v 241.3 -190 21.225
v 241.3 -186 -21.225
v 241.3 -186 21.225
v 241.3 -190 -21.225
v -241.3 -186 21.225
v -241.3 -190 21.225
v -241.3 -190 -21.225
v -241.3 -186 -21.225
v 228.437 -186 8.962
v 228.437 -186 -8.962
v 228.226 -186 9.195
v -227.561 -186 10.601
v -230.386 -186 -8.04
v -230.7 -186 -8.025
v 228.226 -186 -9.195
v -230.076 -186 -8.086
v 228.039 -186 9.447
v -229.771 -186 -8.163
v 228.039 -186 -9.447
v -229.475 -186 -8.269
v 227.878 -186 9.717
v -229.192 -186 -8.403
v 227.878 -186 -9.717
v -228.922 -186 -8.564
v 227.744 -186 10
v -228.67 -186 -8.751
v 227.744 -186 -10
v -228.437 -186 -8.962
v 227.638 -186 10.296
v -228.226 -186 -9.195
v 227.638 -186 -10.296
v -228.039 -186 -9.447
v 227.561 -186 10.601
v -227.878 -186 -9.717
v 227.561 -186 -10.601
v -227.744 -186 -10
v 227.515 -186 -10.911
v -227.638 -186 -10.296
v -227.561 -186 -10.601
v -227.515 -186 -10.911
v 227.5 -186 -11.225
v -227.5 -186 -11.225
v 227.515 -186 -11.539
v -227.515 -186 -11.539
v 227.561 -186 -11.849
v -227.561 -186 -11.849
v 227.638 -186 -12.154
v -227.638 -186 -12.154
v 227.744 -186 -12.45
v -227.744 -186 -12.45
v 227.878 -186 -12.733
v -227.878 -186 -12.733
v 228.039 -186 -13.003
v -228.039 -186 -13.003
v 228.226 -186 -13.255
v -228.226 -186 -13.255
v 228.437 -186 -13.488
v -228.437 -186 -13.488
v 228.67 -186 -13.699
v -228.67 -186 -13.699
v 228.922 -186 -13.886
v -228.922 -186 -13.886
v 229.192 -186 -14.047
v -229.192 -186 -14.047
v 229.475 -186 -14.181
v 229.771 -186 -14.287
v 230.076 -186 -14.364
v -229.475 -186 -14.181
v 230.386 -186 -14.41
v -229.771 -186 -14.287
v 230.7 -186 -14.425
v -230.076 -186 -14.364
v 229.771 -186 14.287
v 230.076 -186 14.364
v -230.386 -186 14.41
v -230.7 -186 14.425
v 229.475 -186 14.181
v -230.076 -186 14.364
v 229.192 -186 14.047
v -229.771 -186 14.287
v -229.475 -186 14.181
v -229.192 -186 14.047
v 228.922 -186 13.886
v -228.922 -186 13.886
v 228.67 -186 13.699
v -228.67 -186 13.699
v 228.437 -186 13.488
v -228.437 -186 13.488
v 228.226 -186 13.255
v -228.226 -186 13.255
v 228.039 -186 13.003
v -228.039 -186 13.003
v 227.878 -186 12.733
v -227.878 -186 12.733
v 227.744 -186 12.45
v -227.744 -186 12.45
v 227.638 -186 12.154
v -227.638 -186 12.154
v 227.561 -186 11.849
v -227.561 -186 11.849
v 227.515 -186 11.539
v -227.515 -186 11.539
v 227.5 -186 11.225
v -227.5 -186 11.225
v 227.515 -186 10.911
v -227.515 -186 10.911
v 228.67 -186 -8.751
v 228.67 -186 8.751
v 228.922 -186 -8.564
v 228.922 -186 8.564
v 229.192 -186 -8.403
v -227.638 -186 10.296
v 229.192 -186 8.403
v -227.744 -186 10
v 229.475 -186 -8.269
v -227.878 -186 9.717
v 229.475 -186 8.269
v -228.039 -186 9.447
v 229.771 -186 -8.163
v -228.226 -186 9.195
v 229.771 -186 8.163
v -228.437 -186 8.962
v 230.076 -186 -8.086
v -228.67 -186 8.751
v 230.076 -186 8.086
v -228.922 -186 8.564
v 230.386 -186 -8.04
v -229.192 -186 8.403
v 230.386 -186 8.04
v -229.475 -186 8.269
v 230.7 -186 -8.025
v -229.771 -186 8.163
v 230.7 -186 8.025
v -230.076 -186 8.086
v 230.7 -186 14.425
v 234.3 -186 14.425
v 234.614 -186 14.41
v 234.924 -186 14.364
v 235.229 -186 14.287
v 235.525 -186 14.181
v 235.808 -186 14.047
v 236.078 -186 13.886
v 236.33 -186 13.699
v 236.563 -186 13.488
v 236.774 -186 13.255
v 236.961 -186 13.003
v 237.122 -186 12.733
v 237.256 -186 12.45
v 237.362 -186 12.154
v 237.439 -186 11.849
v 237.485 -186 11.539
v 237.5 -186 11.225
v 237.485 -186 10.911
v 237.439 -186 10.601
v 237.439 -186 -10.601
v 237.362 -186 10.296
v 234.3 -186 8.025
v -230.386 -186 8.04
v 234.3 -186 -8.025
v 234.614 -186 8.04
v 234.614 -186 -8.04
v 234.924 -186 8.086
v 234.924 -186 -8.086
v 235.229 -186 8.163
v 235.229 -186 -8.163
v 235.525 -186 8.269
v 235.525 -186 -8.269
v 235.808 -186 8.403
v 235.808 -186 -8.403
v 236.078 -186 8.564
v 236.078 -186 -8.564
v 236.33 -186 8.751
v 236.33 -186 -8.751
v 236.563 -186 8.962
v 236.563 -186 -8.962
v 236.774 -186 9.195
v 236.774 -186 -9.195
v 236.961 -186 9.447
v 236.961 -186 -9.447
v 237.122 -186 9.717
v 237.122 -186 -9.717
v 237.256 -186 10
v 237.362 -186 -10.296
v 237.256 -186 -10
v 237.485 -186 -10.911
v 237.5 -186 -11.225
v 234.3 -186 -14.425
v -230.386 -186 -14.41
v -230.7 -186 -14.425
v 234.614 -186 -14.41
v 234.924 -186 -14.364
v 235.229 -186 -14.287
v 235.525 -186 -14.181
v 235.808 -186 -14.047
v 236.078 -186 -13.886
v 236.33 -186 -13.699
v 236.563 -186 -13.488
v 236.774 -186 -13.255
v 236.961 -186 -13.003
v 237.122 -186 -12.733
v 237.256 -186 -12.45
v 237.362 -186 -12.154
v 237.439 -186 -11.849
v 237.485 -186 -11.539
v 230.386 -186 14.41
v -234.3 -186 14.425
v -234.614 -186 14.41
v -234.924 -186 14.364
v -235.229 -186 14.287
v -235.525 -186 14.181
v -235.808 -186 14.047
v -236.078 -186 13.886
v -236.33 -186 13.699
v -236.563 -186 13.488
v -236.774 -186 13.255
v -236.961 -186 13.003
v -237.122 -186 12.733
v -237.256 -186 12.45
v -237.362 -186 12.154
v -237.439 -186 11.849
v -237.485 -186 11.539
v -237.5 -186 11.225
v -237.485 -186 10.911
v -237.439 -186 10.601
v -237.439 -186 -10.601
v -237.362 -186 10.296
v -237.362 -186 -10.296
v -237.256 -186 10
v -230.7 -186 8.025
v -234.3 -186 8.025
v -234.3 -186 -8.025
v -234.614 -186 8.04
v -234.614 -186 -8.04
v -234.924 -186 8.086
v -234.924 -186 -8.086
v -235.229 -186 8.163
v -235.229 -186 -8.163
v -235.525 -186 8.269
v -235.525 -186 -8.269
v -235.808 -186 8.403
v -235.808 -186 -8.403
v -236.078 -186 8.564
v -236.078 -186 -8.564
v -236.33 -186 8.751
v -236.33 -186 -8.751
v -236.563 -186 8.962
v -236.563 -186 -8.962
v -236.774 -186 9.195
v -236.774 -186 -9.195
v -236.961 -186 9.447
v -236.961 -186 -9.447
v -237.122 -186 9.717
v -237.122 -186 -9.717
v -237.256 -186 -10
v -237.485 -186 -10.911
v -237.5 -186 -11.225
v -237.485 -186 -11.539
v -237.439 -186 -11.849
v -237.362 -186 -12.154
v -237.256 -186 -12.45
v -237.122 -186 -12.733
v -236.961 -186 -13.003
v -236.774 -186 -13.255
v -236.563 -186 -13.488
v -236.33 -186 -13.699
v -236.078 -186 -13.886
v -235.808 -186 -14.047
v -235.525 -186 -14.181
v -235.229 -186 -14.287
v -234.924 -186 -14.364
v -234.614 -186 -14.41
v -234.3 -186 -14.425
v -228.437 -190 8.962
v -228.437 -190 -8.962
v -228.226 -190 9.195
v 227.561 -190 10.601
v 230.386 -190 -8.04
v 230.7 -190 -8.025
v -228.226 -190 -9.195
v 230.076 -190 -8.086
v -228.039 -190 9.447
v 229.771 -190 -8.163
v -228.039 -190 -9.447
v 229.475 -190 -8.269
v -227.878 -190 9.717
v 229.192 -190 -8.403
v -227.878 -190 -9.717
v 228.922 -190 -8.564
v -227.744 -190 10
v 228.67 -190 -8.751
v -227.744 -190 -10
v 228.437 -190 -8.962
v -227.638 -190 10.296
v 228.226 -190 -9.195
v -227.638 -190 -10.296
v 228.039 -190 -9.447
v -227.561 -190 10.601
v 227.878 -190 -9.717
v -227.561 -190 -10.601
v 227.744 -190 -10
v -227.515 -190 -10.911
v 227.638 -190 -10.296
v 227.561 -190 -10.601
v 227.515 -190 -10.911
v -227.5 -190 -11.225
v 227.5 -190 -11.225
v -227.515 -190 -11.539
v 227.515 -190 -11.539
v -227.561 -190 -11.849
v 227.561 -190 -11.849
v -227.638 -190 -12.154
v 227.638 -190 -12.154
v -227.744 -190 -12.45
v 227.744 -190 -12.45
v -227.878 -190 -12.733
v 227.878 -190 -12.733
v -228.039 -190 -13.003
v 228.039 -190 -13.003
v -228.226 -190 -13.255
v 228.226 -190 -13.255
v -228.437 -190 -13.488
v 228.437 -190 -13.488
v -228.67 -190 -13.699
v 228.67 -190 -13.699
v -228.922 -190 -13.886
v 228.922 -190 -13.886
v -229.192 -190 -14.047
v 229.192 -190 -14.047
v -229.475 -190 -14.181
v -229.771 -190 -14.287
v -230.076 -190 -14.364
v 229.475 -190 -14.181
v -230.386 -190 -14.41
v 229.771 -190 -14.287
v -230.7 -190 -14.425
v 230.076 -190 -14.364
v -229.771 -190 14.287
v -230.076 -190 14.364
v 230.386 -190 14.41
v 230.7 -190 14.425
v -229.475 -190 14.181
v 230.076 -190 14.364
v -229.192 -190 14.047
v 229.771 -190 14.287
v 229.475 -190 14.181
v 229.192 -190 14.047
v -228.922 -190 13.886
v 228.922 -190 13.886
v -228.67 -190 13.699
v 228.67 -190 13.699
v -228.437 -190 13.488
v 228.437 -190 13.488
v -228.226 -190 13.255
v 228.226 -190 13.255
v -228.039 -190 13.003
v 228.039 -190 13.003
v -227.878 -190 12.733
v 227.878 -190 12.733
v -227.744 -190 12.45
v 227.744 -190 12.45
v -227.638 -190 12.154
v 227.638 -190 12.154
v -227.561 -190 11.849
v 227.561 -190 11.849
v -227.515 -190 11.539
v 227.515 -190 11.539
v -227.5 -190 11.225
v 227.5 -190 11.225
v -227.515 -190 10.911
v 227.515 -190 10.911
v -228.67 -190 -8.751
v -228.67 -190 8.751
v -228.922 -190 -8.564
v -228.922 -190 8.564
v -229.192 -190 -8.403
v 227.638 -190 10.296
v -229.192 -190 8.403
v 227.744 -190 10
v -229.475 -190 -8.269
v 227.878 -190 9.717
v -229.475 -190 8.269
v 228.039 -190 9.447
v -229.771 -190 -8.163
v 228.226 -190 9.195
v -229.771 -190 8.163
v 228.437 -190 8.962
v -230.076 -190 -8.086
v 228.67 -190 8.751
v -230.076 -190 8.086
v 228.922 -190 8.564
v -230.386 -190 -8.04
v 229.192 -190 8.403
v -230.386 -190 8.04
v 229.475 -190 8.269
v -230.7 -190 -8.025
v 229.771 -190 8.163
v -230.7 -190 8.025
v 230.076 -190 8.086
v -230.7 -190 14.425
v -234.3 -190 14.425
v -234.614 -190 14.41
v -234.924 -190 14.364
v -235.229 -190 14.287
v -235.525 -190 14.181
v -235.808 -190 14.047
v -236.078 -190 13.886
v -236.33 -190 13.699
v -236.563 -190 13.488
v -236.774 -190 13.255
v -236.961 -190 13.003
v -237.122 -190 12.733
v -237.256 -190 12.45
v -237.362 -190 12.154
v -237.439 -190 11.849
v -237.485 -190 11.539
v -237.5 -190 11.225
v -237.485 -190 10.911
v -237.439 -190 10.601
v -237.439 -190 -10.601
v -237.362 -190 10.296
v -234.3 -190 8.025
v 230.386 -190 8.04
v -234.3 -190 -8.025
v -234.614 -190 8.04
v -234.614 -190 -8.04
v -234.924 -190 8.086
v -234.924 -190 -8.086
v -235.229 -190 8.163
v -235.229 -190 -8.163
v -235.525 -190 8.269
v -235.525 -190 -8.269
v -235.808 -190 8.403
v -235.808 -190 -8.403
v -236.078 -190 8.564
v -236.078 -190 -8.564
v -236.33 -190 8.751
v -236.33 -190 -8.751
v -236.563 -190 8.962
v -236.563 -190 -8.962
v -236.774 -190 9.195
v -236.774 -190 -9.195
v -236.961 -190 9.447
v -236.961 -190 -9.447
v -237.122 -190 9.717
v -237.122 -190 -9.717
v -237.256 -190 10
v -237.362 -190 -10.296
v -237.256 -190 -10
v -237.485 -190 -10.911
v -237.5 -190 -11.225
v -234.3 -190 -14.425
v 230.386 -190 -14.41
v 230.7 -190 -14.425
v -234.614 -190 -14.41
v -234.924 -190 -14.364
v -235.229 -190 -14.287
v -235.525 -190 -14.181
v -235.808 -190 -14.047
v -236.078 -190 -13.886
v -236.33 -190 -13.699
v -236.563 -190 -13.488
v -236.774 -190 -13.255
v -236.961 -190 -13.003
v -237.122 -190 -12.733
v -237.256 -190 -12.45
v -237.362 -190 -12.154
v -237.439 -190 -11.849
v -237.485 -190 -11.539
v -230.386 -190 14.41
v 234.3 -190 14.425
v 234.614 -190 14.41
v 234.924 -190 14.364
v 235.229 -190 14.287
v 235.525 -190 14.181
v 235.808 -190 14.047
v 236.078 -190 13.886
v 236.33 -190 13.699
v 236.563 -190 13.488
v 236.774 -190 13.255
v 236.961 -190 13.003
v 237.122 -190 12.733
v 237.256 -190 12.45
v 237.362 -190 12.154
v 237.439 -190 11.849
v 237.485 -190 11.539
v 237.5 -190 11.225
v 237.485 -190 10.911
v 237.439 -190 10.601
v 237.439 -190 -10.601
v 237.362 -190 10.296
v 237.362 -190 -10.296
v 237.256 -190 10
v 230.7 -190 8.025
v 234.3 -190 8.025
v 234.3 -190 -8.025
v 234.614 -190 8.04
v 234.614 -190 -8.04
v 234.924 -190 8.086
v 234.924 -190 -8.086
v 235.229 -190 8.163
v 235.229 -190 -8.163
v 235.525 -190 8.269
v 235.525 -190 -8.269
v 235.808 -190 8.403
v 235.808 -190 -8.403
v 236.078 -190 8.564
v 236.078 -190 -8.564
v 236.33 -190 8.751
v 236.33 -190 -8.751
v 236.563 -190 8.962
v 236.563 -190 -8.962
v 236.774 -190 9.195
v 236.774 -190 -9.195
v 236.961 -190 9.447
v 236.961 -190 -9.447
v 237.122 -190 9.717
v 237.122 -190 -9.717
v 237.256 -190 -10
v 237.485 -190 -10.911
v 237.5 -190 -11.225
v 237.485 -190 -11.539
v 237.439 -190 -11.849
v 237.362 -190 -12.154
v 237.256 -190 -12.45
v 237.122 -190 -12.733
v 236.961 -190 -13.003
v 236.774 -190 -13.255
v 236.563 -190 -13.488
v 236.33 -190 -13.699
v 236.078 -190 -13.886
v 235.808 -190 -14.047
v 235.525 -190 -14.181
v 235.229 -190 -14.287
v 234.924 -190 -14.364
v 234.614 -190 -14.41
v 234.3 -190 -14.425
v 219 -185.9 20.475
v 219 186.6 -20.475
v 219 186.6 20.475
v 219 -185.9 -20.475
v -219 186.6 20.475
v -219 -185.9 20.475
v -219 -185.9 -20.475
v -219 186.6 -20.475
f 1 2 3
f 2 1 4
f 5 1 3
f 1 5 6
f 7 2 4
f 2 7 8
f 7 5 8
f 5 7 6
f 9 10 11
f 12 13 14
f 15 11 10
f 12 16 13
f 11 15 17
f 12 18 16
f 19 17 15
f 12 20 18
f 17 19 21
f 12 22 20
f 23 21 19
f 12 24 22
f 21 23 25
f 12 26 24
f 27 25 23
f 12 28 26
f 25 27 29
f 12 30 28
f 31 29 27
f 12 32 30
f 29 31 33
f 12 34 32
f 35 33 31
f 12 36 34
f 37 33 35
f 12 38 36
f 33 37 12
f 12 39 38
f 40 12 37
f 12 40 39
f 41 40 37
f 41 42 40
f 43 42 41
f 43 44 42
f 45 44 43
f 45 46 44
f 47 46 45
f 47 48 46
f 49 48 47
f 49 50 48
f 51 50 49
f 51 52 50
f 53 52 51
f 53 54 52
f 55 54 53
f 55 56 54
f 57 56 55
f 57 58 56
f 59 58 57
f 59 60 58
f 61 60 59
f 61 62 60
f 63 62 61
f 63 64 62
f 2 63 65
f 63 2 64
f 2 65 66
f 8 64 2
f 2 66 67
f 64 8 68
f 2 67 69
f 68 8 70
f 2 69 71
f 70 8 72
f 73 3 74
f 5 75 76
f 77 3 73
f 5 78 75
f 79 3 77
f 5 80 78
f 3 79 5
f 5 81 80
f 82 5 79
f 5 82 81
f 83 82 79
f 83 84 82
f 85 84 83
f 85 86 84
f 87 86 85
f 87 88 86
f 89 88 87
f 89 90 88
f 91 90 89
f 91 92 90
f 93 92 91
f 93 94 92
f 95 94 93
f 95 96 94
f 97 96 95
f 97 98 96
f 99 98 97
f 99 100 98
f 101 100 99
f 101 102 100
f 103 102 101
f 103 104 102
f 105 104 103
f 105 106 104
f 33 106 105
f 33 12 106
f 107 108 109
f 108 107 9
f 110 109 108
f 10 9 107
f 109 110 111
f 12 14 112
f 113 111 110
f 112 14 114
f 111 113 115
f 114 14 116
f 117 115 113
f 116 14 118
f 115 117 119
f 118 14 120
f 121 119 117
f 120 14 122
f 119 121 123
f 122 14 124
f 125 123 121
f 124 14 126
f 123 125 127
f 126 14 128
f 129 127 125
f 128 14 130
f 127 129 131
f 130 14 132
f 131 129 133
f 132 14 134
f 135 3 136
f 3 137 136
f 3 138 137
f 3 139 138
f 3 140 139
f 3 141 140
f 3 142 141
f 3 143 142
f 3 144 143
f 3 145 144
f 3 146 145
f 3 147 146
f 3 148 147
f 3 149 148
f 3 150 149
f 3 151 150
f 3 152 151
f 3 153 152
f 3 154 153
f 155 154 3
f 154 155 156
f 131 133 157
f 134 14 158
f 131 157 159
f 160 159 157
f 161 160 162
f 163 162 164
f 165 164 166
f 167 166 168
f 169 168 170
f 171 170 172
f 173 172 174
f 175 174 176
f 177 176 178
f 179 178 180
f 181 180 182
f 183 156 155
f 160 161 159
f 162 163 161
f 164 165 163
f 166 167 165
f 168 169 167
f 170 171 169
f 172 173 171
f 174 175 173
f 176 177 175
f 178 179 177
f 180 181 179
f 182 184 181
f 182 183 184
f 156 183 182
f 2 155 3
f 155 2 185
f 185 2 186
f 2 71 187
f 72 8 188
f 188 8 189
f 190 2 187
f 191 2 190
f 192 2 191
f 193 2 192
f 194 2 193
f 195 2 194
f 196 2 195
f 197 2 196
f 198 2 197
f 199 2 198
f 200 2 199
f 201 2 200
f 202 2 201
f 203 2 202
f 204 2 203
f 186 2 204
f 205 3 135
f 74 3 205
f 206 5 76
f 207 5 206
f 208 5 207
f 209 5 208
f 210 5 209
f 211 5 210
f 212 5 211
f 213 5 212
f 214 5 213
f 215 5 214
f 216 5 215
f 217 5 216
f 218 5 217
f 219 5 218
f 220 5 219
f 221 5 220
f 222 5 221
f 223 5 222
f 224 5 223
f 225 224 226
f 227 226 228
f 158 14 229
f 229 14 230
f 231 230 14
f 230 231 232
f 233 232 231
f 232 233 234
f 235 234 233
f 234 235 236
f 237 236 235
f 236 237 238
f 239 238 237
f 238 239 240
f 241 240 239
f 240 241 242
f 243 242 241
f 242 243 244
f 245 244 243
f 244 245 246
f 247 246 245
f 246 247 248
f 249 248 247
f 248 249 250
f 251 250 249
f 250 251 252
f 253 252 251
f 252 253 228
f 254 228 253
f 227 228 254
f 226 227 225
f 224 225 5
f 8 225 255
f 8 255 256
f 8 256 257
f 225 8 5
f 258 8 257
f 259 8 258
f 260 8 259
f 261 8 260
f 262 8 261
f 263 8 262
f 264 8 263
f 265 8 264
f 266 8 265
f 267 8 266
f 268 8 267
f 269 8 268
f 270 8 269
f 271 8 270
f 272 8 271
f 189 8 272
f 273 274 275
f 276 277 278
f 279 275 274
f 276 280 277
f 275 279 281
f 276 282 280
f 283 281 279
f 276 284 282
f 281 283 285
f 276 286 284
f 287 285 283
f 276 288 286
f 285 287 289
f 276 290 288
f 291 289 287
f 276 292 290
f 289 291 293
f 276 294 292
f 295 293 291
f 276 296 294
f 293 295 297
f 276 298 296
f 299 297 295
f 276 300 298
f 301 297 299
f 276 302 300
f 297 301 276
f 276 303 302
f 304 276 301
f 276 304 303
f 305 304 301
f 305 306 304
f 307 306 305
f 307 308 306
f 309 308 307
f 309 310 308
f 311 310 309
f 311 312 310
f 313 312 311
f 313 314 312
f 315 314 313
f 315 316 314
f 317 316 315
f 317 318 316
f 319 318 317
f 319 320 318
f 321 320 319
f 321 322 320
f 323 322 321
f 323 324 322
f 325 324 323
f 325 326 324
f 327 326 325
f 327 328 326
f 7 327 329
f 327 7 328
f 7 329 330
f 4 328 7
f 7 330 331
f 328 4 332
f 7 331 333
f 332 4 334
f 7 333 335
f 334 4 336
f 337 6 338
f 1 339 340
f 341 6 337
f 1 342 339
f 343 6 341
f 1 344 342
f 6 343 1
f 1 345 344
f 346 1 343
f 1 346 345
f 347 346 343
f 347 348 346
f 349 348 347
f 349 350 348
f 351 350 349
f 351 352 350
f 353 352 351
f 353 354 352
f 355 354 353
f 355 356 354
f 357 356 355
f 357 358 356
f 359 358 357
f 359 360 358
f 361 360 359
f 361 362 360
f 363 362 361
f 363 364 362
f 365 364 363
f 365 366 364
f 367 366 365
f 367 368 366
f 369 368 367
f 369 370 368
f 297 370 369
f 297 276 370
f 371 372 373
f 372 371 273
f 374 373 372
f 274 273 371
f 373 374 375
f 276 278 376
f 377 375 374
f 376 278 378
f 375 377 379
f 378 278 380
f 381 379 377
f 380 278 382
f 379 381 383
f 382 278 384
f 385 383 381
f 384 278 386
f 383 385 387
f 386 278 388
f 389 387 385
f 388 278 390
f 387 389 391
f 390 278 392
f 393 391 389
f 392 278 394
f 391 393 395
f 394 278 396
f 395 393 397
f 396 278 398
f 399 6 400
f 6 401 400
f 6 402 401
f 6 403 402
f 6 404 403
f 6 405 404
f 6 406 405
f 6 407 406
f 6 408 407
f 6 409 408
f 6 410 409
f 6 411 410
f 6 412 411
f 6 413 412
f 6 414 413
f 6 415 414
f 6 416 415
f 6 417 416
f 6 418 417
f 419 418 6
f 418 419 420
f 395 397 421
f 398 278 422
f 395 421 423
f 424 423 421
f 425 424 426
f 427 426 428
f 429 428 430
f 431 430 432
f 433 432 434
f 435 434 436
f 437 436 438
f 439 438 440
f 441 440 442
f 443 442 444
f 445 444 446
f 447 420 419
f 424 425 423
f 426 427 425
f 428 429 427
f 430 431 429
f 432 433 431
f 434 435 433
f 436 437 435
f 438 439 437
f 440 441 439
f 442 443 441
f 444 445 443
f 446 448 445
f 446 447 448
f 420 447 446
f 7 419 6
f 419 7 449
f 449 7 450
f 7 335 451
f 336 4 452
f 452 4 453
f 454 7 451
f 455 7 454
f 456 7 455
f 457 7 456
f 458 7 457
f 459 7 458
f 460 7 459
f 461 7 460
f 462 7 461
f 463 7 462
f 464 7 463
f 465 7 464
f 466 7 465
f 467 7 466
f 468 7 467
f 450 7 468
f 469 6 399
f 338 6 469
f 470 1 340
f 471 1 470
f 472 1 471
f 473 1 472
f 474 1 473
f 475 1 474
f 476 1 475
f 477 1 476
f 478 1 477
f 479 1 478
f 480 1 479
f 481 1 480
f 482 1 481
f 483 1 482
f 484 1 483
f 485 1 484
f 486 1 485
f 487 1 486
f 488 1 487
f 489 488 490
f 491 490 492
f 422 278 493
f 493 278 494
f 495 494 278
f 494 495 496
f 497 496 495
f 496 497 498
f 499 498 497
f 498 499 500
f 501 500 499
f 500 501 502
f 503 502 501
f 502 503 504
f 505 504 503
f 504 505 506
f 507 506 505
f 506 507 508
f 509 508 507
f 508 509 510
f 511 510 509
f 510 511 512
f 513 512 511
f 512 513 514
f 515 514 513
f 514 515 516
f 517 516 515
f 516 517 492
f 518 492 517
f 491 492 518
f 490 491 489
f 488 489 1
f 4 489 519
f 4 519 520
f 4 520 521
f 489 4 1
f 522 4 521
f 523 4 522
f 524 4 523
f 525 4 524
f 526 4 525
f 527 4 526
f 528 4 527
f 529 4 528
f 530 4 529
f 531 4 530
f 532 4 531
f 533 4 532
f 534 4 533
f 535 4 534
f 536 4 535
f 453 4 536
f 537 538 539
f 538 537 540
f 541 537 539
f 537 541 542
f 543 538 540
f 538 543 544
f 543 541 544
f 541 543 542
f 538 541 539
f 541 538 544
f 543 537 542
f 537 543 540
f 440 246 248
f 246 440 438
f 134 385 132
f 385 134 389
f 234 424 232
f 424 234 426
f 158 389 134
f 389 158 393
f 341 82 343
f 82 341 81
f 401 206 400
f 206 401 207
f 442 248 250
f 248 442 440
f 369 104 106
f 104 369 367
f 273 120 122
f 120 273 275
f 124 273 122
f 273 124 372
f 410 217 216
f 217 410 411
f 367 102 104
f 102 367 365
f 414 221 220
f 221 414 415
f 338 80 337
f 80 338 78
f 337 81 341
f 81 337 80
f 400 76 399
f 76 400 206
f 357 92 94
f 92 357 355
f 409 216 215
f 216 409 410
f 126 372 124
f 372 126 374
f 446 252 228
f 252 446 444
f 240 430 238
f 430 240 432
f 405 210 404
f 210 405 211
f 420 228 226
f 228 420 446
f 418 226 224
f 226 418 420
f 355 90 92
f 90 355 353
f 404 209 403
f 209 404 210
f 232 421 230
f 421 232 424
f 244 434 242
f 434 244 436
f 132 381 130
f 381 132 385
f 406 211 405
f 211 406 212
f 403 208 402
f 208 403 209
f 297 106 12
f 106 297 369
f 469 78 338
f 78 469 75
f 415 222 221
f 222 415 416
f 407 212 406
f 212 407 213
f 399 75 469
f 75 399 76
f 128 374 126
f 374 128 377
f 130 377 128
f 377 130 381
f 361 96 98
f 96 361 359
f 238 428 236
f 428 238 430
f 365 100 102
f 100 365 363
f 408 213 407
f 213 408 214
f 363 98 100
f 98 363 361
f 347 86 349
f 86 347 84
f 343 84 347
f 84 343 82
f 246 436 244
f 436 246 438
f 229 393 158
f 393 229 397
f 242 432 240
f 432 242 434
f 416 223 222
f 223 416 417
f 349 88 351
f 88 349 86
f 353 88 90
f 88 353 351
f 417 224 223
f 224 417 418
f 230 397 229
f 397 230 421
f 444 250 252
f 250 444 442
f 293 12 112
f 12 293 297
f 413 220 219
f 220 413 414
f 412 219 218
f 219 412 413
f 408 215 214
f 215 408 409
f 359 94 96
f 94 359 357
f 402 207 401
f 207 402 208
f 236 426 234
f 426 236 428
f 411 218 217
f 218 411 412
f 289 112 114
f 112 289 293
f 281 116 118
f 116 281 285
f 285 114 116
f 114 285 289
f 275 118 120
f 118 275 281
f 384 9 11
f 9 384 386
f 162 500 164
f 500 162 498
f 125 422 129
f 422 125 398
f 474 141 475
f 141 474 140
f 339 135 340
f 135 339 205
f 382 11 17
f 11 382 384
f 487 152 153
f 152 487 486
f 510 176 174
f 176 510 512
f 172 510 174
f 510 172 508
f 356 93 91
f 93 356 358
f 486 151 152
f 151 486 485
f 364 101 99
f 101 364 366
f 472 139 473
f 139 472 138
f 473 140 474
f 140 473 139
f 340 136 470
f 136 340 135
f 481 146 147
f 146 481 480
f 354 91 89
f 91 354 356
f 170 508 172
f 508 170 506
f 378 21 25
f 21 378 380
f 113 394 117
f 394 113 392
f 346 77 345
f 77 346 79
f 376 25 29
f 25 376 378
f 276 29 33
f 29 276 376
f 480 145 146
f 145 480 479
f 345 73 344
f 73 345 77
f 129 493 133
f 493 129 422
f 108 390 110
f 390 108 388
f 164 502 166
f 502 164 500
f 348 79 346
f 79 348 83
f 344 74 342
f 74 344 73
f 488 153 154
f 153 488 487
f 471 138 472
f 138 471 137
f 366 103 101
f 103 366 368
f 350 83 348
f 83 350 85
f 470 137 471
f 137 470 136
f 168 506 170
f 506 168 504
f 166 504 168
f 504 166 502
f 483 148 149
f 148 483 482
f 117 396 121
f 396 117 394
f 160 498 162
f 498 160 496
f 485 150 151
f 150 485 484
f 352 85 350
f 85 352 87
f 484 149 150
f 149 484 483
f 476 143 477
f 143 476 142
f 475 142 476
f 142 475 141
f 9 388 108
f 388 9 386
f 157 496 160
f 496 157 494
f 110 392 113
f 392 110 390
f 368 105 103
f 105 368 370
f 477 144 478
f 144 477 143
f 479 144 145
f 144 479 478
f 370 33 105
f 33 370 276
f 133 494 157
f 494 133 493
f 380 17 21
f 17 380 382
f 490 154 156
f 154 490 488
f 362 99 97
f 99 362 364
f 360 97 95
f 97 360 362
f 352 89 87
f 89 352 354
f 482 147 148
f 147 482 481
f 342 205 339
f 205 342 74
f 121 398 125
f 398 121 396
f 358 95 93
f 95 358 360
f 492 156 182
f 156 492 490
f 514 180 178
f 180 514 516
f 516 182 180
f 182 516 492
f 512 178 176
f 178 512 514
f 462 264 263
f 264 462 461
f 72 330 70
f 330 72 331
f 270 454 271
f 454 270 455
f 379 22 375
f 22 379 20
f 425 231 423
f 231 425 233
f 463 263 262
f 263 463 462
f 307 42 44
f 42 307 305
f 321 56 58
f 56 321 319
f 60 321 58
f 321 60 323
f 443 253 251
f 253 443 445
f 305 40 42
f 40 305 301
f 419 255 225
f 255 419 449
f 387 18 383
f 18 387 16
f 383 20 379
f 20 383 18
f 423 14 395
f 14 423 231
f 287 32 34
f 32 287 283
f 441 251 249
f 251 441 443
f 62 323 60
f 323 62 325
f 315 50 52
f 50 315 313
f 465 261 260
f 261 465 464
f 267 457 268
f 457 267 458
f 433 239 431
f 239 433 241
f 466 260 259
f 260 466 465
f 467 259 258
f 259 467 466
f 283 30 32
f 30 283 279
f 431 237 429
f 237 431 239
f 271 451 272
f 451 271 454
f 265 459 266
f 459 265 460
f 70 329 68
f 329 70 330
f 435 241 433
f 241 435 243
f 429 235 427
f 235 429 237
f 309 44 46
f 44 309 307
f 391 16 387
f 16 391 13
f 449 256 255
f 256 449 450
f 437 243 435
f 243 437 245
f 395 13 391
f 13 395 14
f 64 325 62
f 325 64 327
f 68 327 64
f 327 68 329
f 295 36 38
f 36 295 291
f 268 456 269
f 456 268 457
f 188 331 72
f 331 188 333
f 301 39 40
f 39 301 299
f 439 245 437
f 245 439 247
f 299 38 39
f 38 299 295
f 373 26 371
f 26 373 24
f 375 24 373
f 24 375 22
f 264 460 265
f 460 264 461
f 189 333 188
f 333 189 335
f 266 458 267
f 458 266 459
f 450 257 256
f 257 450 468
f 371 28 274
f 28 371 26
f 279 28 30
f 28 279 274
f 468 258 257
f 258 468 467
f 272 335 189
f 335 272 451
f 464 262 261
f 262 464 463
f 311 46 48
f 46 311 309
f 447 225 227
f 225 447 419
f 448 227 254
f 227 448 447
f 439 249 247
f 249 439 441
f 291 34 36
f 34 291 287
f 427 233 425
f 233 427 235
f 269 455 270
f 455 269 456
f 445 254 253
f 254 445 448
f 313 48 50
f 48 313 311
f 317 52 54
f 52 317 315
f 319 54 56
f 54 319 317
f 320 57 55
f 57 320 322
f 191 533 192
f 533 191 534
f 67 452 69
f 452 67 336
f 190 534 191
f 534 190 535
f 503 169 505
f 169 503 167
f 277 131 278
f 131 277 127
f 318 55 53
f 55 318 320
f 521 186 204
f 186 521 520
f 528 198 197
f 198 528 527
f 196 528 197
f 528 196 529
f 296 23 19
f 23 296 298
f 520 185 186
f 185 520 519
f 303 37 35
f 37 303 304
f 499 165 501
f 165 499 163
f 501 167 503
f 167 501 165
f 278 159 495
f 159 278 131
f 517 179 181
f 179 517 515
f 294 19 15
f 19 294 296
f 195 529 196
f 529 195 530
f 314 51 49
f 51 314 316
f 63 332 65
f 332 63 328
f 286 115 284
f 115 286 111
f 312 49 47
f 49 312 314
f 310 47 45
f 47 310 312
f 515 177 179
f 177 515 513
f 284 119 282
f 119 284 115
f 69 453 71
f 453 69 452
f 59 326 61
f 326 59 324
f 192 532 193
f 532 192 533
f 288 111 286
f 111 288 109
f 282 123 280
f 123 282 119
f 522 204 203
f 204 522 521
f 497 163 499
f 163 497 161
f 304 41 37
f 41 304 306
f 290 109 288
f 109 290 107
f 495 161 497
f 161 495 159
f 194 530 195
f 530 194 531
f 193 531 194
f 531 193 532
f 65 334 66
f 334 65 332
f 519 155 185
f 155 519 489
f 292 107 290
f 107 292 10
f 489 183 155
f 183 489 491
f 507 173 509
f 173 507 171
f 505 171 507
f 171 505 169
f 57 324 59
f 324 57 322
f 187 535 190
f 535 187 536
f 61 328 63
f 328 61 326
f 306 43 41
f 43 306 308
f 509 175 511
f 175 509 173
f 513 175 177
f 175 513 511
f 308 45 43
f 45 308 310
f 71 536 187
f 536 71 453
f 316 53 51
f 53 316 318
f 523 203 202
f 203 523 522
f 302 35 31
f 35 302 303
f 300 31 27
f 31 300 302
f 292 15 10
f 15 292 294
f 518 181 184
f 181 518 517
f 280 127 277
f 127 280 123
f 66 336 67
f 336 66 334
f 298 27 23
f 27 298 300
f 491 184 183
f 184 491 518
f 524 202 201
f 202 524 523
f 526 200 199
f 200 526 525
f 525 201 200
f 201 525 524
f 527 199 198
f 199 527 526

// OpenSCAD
// ============================================================================
// Atom Lithography Machine — Parametric OpenSCAD Module (S3.3-04)
// ============================================================================
// part_id           : S3.3-04
// parent_bom_id     : S3.3
// subsystem         : S3
// part_name         : 1U EMI kalkanli sayim sase ve senkronizasyon arayuzu
// material          : Al 6061
// temp_stage        : 300 K (kabin)
// vacuum_grade      : Atmosfer
// tolerance         : ISO 2768-mK
// computed_mass_kg  : 4.01454
// envelope_mm       : 482.600 x 415.000 x 42.450
// design_maturity   : M0_M1_DETAILED_CAD_DESIGN_ONLY
// no_lab_measurement: true
// iec61508_certified: false
// semi_s2_certified : false
// Units: millimeters (mm)
// ============================================================================

$fn = 64;

// Nominal bounding envelope parameters (mm)
bbox_x = 482.6000;
bbox_y = 415.0000;
bbox_z = 42.4500;

// Part-specific parametric dimensions
rack_u_height = 1;
depth_mm = 380.0;
sync_freq_mhz = 10;

// Interface / port parameters (mm)

module part_S3_3_04() {
  difference() {
    union() {
      // 19-inch EIA-310 1U front faceplate (482.6 x 42.5 mm, facing -Y)
      translate([0.000, -188.000, 0.000]) cube([482.600, 4.000, 42.450], center=true);
      // Hollow EMI-shielded chassis body
      translate([0.000, 0.350, 0.000]) cube([438.000, 372.500, 40.950], center=true);
    }
    // EIA-310 upper-left rack ear slot
    translate([-232.500, -188.000, 11.225]) rotate([90.000, 0.000, 0.000]) {
      hull() {
        translate([-1.800, 0, 0]) cylinder(d=6.400, h=8.000, center=true);
        translate([1.800, 0, 0]) cylinder(d=6.400, h=8.000, center=true);
      }
    }
    // EIA-310 upper-right rack ear slot
    translate([232.500, -188.000, 11.225]) rotate([90.000, 0.000, 0.000]) {
      hull() {
        translate([-1.800, 0, 0]) cylinder(d=6.400, h=8.000, center=true);
        translate([1.800, 0, 0]) cylinder(d=6.400, h=8.000, center=true);
      }
    }
    // EIA-310 lower-left rack ear slot
    translate([-232.500, -188.000, -11.225]) rotate([90.000, 0.000, 0.000]) {
      hull() {
        translate([-1.800, 0, 0]) cylinder(d=6.400, h=8.000, center=true);
        translate([1.800, 0, 0]) cylinder(d=6.400, h=8.000, center=true);
      }
    }
    // EIA-310 lower-right rack ear slot
    translate([232.500, -188.000, -11.225]) rotate([90.000, 0.000, 0.000]) {
      hull() {
        translate([-1.800, 0, 0]) cylinder(d=6.400, h=8.000, center=true);
        translate([1.800, 0, 0]) cylinder(d=6.400, h=8.000, center=true);
      }
    }
  }
}

// World assembly mounting transform (global machine frame, mm / deg):
// translate([1480.000, -220.000, 590.125]) rotate([0.000, 0.000, 0.000]) part_S3_3_04();

part_S3_3_04();
